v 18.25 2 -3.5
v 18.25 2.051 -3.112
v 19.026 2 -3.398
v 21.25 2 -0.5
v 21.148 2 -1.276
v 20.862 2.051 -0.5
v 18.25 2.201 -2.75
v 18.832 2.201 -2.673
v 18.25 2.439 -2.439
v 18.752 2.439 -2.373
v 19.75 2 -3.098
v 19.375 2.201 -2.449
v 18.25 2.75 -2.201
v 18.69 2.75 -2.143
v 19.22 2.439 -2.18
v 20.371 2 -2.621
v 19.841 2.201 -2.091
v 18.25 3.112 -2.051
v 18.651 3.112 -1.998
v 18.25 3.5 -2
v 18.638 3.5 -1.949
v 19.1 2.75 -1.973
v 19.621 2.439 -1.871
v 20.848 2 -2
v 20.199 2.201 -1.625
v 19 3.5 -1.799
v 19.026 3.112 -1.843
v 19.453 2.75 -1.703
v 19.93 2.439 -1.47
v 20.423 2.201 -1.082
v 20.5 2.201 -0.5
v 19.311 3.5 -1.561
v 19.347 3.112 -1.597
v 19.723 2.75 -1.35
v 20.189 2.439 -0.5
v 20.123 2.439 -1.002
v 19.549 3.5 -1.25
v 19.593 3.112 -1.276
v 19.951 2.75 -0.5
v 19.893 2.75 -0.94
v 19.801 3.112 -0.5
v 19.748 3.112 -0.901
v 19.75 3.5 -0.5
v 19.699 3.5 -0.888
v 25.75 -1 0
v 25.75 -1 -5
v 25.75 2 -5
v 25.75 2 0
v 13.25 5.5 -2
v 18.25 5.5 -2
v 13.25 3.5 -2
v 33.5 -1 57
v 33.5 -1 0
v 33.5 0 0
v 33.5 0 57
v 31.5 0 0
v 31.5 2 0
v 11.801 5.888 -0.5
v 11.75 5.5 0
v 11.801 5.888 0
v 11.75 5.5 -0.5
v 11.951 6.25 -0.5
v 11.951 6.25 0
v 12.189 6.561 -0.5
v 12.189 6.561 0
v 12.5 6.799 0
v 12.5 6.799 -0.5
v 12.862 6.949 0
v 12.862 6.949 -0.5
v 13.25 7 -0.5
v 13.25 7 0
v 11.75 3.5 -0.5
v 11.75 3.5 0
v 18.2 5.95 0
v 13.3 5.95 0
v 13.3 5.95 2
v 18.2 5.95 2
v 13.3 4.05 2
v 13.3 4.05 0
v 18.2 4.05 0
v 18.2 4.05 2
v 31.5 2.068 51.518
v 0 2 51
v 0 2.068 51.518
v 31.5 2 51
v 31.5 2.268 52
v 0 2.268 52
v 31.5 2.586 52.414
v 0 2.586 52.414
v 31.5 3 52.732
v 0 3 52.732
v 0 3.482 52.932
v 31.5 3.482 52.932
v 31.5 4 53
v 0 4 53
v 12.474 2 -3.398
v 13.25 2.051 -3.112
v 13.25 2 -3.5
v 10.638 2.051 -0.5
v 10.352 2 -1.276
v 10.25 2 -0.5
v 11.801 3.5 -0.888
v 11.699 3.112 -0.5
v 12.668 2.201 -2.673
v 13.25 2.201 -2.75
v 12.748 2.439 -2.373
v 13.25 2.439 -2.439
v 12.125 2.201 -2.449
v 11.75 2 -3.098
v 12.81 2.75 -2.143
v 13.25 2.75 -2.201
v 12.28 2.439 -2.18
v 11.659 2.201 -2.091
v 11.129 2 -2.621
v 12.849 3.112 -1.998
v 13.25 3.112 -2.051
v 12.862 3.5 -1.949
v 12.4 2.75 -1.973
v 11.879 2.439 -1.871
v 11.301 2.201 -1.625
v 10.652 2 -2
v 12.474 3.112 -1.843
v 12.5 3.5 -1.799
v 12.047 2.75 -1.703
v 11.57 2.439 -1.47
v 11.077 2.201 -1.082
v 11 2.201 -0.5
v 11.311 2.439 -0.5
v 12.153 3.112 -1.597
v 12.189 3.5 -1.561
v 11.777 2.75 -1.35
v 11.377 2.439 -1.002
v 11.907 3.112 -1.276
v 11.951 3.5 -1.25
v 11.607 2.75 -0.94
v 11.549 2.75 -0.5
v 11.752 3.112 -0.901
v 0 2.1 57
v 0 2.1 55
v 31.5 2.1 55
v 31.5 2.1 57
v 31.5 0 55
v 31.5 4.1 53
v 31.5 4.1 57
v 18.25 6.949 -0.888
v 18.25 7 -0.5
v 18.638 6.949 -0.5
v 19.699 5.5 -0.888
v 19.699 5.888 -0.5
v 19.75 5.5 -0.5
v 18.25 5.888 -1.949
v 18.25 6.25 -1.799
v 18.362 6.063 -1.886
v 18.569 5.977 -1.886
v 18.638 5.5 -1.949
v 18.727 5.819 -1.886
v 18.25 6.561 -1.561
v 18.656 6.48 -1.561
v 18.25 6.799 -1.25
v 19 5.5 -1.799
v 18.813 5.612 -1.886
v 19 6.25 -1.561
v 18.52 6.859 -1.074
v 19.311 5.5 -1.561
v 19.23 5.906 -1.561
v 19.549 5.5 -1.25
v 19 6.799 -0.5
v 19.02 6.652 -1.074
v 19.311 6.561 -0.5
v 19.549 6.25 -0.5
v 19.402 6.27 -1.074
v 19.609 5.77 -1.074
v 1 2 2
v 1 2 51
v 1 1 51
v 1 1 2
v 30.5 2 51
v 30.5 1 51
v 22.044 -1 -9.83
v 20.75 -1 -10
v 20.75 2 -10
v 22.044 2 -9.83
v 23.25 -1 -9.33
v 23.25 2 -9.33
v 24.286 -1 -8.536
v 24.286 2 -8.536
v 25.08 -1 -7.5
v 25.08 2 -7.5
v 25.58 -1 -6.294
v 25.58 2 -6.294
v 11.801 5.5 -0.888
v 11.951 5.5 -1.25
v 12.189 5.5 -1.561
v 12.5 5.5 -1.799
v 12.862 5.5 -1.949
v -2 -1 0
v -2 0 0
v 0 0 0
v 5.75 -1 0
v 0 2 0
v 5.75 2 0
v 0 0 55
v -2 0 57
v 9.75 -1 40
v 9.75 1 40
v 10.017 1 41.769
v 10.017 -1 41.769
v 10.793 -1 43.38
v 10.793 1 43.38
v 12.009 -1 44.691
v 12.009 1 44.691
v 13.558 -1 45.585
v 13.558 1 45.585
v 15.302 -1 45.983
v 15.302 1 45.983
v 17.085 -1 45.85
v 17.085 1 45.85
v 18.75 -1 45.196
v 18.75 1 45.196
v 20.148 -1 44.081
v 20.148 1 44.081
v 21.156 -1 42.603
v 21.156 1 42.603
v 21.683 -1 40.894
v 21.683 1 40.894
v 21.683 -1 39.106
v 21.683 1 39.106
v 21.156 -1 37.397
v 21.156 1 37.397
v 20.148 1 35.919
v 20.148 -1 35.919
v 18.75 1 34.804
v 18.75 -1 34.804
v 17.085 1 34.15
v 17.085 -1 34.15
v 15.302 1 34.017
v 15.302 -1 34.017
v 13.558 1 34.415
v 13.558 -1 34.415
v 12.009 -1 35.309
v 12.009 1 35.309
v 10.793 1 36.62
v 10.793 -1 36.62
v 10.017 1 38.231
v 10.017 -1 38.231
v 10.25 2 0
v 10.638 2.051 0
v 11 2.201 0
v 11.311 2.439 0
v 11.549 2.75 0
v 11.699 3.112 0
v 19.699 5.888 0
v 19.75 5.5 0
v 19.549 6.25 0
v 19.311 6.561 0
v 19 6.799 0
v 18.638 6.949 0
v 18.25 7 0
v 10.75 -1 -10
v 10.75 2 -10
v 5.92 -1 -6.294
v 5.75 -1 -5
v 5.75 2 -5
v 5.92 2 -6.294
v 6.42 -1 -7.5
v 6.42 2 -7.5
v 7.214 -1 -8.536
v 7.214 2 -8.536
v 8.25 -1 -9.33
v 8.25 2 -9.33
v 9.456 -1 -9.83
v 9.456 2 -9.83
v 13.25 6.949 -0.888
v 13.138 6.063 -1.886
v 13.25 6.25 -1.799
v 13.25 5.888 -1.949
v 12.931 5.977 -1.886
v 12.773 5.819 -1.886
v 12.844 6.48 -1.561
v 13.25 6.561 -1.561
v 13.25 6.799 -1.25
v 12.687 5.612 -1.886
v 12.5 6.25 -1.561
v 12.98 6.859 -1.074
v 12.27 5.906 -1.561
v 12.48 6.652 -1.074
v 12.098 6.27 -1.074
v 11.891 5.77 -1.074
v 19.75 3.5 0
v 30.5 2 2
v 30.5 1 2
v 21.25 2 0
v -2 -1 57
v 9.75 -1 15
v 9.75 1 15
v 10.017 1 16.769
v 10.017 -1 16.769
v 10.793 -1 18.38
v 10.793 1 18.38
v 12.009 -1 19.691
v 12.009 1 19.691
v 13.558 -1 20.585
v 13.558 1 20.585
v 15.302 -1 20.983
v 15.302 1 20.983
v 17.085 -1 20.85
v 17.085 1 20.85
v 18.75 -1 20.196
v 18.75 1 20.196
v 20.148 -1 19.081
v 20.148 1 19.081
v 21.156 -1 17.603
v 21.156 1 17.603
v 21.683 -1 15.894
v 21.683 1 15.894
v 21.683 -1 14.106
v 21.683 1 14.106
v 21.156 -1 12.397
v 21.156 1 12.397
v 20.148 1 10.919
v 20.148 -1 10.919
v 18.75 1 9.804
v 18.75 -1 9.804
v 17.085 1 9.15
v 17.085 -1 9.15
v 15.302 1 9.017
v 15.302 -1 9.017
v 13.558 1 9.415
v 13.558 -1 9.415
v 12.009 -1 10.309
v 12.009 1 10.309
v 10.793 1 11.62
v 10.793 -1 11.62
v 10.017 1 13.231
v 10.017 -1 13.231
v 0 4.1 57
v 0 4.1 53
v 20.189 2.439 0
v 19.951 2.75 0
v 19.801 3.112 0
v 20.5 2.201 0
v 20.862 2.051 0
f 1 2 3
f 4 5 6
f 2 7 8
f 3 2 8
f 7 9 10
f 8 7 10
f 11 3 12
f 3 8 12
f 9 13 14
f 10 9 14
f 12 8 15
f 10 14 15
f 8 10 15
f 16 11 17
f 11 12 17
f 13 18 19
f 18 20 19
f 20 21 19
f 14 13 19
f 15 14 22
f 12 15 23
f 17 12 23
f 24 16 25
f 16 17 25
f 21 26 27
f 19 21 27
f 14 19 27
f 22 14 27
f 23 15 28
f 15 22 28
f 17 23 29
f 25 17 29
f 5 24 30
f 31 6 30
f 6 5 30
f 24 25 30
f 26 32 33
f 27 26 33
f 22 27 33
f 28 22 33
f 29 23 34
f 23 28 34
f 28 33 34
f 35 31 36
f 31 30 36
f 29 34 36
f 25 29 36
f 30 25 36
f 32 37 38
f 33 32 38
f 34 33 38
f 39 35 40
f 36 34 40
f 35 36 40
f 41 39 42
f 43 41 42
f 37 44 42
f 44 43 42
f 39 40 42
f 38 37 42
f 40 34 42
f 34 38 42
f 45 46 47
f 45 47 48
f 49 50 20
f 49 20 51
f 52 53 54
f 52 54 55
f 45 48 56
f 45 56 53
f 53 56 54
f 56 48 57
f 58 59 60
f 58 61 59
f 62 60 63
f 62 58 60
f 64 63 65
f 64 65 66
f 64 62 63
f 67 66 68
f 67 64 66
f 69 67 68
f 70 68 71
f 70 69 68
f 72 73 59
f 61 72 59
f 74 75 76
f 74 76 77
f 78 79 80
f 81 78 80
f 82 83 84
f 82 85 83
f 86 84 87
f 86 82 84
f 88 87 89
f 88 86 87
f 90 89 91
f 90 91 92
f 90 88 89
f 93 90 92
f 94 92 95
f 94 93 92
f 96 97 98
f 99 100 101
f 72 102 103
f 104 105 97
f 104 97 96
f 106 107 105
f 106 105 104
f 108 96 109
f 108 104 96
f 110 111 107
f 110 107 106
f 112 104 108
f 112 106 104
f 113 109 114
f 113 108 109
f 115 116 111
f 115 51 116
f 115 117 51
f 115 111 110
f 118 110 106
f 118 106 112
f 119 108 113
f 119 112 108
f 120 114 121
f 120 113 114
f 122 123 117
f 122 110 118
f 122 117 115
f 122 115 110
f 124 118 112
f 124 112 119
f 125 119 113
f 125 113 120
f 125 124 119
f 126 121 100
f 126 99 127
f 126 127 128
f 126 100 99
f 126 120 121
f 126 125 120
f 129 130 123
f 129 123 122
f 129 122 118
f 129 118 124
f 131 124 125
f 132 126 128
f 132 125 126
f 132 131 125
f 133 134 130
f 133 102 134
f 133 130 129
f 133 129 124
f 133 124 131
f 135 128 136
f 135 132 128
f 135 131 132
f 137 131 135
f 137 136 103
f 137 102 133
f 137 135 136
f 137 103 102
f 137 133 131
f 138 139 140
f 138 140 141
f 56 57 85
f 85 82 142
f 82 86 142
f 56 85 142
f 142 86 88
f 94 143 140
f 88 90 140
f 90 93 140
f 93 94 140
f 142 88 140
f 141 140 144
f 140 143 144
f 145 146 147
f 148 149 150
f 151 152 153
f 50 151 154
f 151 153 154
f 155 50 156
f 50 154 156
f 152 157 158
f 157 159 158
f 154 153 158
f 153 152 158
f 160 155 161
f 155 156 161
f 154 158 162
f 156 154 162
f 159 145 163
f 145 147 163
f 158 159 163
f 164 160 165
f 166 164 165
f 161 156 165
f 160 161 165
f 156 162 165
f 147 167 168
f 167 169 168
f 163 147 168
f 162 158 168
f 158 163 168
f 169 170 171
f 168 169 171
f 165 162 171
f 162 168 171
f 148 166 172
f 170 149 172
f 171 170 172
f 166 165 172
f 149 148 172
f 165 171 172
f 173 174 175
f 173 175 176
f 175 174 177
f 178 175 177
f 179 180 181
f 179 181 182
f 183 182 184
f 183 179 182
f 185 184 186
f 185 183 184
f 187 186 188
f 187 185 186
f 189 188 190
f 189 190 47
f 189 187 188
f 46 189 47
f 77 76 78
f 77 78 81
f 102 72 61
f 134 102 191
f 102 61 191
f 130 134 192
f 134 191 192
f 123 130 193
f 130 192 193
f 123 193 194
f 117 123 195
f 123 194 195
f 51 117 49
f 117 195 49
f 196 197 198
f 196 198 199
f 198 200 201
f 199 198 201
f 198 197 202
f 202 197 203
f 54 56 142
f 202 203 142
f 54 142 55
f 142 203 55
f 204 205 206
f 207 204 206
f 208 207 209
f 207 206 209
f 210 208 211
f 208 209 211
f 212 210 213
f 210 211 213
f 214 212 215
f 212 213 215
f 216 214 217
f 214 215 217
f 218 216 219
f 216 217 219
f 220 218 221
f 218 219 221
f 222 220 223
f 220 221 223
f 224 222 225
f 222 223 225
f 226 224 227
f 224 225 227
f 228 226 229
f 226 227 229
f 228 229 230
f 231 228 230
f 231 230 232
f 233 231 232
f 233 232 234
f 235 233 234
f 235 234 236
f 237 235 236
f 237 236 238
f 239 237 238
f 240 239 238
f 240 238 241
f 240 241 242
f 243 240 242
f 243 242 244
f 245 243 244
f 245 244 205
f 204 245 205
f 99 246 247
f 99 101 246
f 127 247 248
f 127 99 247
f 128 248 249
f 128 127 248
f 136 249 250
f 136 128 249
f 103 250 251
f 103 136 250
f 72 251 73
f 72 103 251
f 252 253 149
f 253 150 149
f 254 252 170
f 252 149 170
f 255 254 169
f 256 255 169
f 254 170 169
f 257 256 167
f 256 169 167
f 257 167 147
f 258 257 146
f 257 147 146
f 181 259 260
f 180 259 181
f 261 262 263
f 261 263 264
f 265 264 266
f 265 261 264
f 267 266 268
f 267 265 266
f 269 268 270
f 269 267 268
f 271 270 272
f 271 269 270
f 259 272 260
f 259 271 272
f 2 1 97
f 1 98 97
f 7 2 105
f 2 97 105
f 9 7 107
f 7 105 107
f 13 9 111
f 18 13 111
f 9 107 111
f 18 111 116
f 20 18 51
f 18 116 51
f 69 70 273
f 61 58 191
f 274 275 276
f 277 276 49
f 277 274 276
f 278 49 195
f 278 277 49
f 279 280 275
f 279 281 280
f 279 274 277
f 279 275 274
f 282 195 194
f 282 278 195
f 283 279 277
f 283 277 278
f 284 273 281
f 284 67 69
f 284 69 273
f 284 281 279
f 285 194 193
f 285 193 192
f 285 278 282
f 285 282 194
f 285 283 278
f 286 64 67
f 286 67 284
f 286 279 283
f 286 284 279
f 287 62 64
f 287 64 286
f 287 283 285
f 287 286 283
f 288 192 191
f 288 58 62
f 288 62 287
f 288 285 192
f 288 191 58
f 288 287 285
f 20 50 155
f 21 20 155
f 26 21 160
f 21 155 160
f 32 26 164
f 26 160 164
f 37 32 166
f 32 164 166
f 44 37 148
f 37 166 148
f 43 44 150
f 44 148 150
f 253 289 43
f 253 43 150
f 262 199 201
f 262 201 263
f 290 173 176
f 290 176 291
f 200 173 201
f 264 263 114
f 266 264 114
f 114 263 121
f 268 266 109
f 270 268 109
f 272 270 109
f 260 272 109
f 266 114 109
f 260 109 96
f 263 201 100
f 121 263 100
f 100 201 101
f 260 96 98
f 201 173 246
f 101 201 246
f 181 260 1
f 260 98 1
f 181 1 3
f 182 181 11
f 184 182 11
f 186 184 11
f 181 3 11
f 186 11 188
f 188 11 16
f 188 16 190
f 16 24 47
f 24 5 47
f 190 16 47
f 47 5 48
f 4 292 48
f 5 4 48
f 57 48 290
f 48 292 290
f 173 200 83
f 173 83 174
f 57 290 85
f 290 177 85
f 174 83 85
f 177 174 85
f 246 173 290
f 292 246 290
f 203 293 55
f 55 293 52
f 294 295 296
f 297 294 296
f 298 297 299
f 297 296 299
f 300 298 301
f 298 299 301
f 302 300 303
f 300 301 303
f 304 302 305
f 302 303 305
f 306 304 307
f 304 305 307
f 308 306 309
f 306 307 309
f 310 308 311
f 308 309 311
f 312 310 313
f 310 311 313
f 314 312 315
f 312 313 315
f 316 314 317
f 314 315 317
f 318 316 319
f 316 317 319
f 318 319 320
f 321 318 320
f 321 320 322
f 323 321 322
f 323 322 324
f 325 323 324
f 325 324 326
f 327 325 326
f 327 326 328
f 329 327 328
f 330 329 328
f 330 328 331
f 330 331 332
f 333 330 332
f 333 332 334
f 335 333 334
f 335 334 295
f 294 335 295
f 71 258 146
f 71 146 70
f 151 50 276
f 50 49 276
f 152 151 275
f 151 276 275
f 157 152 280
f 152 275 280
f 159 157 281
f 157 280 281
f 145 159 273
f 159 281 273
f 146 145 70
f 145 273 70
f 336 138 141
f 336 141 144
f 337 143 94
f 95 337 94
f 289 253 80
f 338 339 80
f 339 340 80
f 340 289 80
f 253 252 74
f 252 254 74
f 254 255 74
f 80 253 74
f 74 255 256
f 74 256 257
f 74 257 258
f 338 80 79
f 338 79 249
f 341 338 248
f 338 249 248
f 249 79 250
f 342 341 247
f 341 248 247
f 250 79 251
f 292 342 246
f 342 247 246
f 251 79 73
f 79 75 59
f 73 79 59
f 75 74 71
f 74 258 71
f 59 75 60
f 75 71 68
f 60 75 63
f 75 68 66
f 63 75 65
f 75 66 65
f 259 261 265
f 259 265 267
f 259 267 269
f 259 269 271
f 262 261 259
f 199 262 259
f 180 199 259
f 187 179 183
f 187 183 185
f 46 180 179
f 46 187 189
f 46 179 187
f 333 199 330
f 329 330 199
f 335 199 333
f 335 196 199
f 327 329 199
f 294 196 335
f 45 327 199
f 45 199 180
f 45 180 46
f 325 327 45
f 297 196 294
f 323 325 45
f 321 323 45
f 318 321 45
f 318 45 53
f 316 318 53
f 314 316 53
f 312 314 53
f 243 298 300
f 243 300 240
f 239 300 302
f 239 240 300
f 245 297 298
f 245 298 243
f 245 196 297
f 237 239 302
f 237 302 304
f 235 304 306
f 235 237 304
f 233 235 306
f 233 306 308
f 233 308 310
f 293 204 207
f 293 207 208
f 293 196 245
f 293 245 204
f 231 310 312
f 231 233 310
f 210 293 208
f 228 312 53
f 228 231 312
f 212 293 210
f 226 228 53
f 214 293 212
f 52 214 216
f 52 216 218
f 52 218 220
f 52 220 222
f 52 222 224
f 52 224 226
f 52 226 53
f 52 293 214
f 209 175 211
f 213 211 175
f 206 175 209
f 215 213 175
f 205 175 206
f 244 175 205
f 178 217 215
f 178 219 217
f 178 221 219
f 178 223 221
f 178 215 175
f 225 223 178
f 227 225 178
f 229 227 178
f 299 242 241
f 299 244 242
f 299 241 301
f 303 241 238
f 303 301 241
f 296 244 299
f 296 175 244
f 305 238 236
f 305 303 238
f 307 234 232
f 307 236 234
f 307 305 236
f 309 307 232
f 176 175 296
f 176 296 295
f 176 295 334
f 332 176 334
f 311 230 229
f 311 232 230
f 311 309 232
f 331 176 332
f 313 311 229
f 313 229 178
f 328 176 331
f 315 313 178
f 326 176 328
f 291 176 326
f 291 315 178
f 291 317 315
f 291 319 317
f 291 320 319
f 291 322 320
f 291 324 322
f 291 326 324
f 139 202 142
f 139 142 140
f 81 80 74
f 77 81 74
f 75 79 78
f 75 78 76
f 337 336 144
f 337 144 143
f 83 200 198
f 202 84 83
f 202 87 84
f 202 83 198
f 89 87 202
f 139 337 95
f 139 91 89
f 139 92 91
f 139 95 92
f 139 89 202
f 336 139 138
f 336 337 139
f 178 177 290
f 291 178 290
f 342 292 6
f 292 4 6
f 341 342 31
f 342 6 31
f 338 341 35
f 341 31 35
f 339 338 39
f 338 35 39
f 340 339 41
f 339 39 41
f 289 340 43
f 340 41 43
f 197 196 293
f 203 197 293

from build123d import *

# Parameters (mm, degrees)
BOSS_EXTRU_1_DEPTH      = 55
ESQUISSE2_W             = 35.5
ESQUISSE2_H             = 2
BOSS_EXTRU_2_DEPTH      = 1
BOSS_EXTRU_3_DEPTH      = 31.5
ESQUISSE4_W             = 8
ESQUISSE4_H             = 6.5
BOSS_EXTRU_4_DEPTH      = 2
ESQUISSE5_W             = 4.9
ESQUISSE5_H             = 1.9
BOSS_EXTRU_5_DEPTH      = 2
BOSS_EXTRU_6_DEPTH      = 3
ESQUISSE8_W             = 29.5
ESQUISSE8_H             = 49
ENL_V_MAT_EXTRU_2_DEPTH = 1
CONG_1_R                = 2
CONG_4_R                = 1.5
ESQUISSE7_R             = 6
ENL_V_MAT_EXTRU_1_DEPTH = 67.304223093


with BuildPart() as part:
    # Esquisse1 → Boss.-Extru.1 (new body)
    with BuildSketch(Plane.XY):
        Polygon((0, 0), (-2, 0), (-2, -1), (33.5, -1), (33.5, 0), (31.5, 0), (31.5, 2), (0, 2), align=None)
    extrude(amount=BOSS_EXTRU_1_DEPTH)

    # Esquisse2 → Boss.-Extru.2 (add)
    with BuildSketch(Plane.XZ.offset(1)):
        with Locations((15.75, 56)):
            Rectangle(ESQUISSE2_W, ESQUISSE2_H)
    extrude(amount=-BOSS_EXTRU_2_DEPTH)

    # Esquisse3 → Boss.-Extru.3 (add)
    with BuildSketch(Plane.ZY):
        Polygon((55, 2), (55, 2.1), (57, 2.1), (57, 4.1), (53, 4.1), (53, 2), align=None)
    extrude(amount=-BOSS_EXTRU_3_DEPTH)

    # Esquisse4 → Boss.-Extru.4 (add)
    with BuildSketch(Plane(origin=(0, 0, 0), x_dir=(-1, 0, 0), z_dir=(0, 0, -1))):
        with Locations((-15.75, 3.75)):
            Rectangle(ESQUISSE4_W, ESQUISSE4_H)
    extrude(amount=BOSS_EXTRU_4_DEPTH)

    # Esquisse5 → Boss.-Extru.5 (add)
    with BuildSketch(Plane.XY):
        with Locations((15.75, 5)):
            Rectangle(ESQUISSE5_W, ESQUISSE5_H)
    extrude(amount=BOSS_EXTRU_5_DEPTH)

    # Esquisse6 → Boss.-Extru.6 (add)
    with BuildSketch(Plane.XZ.offset(1)):
        with BuildLine():
            Line((5.75, 0), (5.75, -5))
            ThreePointArc((5.75, -5), (7.214466094, -8.535533906), (10.75, -10))
            Line((10.75, -10), (20.75, -10))
            ThreePointArc((20.75, -10), (24.285533906, -8.535533906), (25.75, -5))
            Line((25.75, -5), (25.75, 0))
            Line((25.75, 0), (5.75, 0))
        make_face()
    extrude(amount=-BOSS_EXTRU_6_DEPTH)

    # Esquisse8 → Enlèv. mat.-Extru.2 (cut)
    with BuildSketch(Plane(origin=(0, 2, 0), x_dir=(1, 0, 0), z_dir=(0, 1, 0))):
        with Locations((15.75, -26.5)):
            Rectangle(ESQUISSE8_W, ESQUISSE8_H)
    extrude(amount=-ENL_V_MAT_EXTRU_2_DEPTH, mode=Mode.SUBTRACT)

    # Congé1
    cong_1_edges = [part.edges().sort_by_distance(p)[0] for p in [
        (15.75, 2, 53),
    ]]
    fillet(cong_1_edges, radius=CONG_1_R - 0.0001)  # a hair under: the kernel refuses the full size

    # Congé4
    cong_4_edges = [part.edges().sort_by_distance(p)[0] for p in [
        (11.75, 7, -1),
        (19.75, 7, -1),
        (15.75, 7, -2),
        (19.75, 4.5, -2),
        (11.75, 4.5, -2),
        (15.75, 2, -2),
        (11.75, 2, -1),
        (19.75, 2, -1),
    ]]
    fillet(cong_4_edges, radius=CONG_4_R)

    # Esquisse7 → Enlèv. mat.-Extru.1 (cut, through all)
    with BuildSketch(Plane(origin=(0, 2, 0), x_dir=(1, 0, 0), z_dir=(0, 1, 0))):
        with Locations(Location((15.75, -15, 0), (0, 0, 180))):
            Circle(ESQUISSE7_R)
        with Locations(Location((15.75, -40, 0), (0, 0, 180))):
            Circle(ESQUISSE7_R)
    extrude(amount=-ENL_V_MAT_EXTRU_1_DEPTH, mode=Mode.SUBTRACT)


solid = part.part
